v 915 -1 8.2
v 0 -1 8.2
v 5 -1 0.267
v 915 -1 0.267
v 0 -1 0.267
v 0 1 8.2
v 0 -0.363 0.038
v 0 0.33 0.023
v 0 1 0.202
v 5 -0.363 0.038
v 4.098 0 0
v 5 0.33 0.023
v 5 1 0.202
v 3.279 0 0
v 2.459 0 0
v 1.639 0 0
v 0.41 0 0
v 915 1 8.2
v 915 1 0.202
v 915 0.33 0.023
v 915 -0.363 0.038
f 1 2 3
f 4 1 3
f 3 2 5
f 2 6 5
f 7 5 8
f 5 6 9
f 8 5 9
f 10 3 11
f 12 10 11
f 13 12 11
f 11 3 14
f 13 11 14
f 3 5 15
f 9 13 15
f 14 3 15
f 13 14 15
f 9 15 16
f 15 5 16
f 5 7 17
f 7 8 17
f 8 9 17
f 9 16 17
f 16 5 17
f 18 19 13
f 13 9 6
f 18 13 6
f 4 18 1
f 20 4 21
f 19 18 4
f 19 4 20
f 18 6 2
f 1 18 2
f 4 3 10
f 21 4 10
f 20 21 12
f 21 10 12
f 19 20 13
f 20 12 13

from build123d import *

# Parameters (mm, degrees)
SCHIZZO1_R                  = 8
SCHIZZO1_W                  = 15
SCHIZZO1_H                  = 10
CORPOCENTINA_DEPTH          = 5
RIMOZIONERETROCENTINA_DEPTH = 251.615874848
SCHIZZO3_W                  = 28.2
SCHIZZO3_H                  = 22
TAGLIOLISTELLO_DEPTH        = 14.677233346
ESTRUSIONELISTELLO_DEPTH    = 910


with BuildPart() as part:
    # Schizzo1 → CorpoCentina (new body)
    with BuildSketch(Plane(origin=(0, 0, 0), x_dir=(0, 0, -1), z_dir=(1, 0, 0))):
        with BuildLine():
            add(Edge.make_bspline(
                [(-250, 0), (-250.000228294, -0.008042796), (-248.284955516, 0.172375658), (-246.518112419, 0.308690015), (-242.189387343, 0.685693594), (-236.806461263, 1.074101529), (-229.680385952, 1.49731724), (-221.184158698, 1.823218603), (-211.337618208, 1.967626101), (-200.371188527, 1.833221056), (-188.499913622, 1.38960529), (-175.953687417, 0.706014078), (-162.931424918, -0.160208642), (-149.615771744, -1.148016327), (-136.176354995, -2.19092491), (-122.767140548, -3.219583979), (-109.520053587, -4.152743127), (-96.546095975, -4.938564365), (-83.940819302, -5.536830703), (-71.801839291, -5.947648205), (-60.245256003, -6.218450939), (-49.398732891, -6.355369756), (-39.397226194, -6.381387963), (-30.361934842, -6.26504923), (-22.412181103, -6.012164917), (-15.626227231, -5.597433901), (-10.071907511, -4.928706579), (-5.697692612, -4.040446981), (-2.625320639, -2.865752984), (-0.494884225, -1.71152847), (0.021312549, -0.410454231), (-0.0311692, 0.792659827), (-0.812599242, 2.305684337), (-2.728863517, 4.238352424), (-5.769907241, 6.118172121), (-9.880942804, 7.913594202), (-15.074930468, 9.641318178), (-21.298752222, 11.283896488), (-28.49717212, 12.788381759), (-36.607373406, 14.097834908), (-45.57302844, 15.159429017), (-55.332910074, 15.960903998), (-65.816536498, 16.494069738), (-76.93137626, 16.791989705), (-88.566949028, 16.864754131), (-100.596999886, 16.726715291), (-112.888825982, 16.383385064), (-125.311615819, 15.825573667), (-137.743791097, 15.05233187), (-150.072384382, 14.059339074), (-162.191375056, 12.881586986), (-173.989074322, 11.549280346), (-185.352364446, 10.116249729), (-196.163081698, 8.632379125), (-206.300441402, 7.131513884), (-215.560350587, 5.731221768), (-223.977157043, 4.293295127), (-231.363413336, 3.181808874), (-237.746440904, 2.098942417), (-242.622069366, 1.245861917), (-246.644529332, 0.552864946), (-248.32839844, 0.246216765), (-249.999773563, 0.007977377), (-250, 0)],
                knots=[0, 0, 0, 0, 0.001588889, 0.006329218, 0.014202456, 0.025172808, 0.039173483, 0.056060631, 0.075578924, 0.097363607, 0.120926258, 0.145825281, 0.171670912, 0.198108537, 0.224790184, 0.25139058, 0.277643491, 0.30332675, 0.328257458, 0.352272548, 0.375156062, 0.396620664, 0.416422729, 0.43430442, 0.45005468, 0.463465465, 0.474478994, 0.483169222, 0.489678354, 0.494104066, 0.496910015, 0.497289785, 0.501214273, 0.50645795, 0.513356957, 0.522168632, 0.53296597, 0.545689209, 0.560220779, 0.576438923, 0.594258689, 0.613600245, 0.634342386, 0.656331109, 0.679351894, 0.703152303, 0.727478208, 0.752070739, 0.776691164, 0.801140184, 0.825214387, 0.848697424, 0.871352858, 0.892947449, 0.913230871, 0.931955467, 0.948342069, 0.963693004, 0.976235918, 0.986320059, 0.993788799, 0.998424035, 1, 1, 1, 1], degree=3))
        make_face()
        with Locations((-62.499919709, 5.077322704)):
            Circle(SCHIZZO1_R, mode=Mode.SUBTRACT)
        with Locations((-85.999919709, 5.077322704)):
            Rectangle(SCHIZZO1_W, SCHIZZO1_H, mode=Mode.SUBTRACT)
    extrude(amount=CORPOCENTINA_DEPTH)

    # Schizzo2 → RimozioneRetroCentina (cut, through all)
    with BuildSketch(Plane.ZY):
        with BuildLine():
            Line((10, 7.878242661), (10, -4.848721342))
            add(Edge.make_bspline(
                [(10, -4.848721342), (11.738439481, -5.129194219), (15.73141108, -5.603862327), (22.412181103, -6.012164917), (30.361934842, -6.26504923), (39.397226194, -6.381387963), (49.398732891, -6.355369756), (60.245256003, -6.218450939), (71.801839291, -5.947648205), (83.940819302, -5.536830703), (96.546095975, -4.938564365), (109.520053587, -4.152743127), (122.767140548, -3.219583979), (136.176354995, -2.19092491), (149.615771744, -1.148016327), (162.931424918, -0.160208642), (175.953687417, 0.706014078), (188.499913622, 1.38960529), (200.371188527, 1.833221056), (211.337618208, 1.967626101), (221.184158698, 1.823218603), (229.680385952, 1.49731724), (236.806461263, 1.074101529), (242.189387343, 0.685693594), (246.518112419, 0.308690015), (248.284955516, 0.172375658), (250.427328458, -0.052966701), (248.32839844, 0.246216765), (246.644529332, 0.552864946), (242.622069366, 1.245861917), (237.746440904, 2.098942417), (231.363413336, 3.181808874), (223.977157043, 4.293295127), (215.560350587, 5.731221768), (206.300441402, 7.131513884), (196.163081698, 8.632379125), (185.352364446, 10.116249729), (173.989074322, 11.549280346), (162.191375056, 12.881586986), (150.072384382, 14.059339074), (137.743791097, 15.05233187), (125.311615819, 15.825573667), (112.888825982, 16.383385064), (100.596999886, 16.726715291), (88.566949028, 16.864754131), (76.93137626, 16.791989705), (65.816536498, 16.494069738), (55.332910074, 15.960903998), (45.57302844, 15.159429017), (36.607373406, 14.097834908), (28.49717212, 12.788381759), (21.298752222, 11.283896488), (15.214838321, 9.678242373), (11.571404485, 8.475558385), (10, 7.878242661)],
                knots=[0.526143721, 0.526143721, 0.526143721, 0.526143721, 0.536534535, 0.54994532, 0.56569558, 0.583577271, 0.603379336, 0.624843938, 0.647727452, 0.671742542, 0.69667325, 0.722356509, 0.74860942, 0.775209816, 0.801891463, 0.828329088, 0.854174719, 0.879073742, 0.902636393, 0.924421076, 0.943939369, 0.960826517, 0.974827192, 0.985797544, 0.993670782, 0.998411111, 1, 1.001575965, 1.006211201, 1.013679941, 1.023764082, 1.036306996, 1.051657931, 1.068044533, 1.086769129, 1.107052551, 1.128647142, 1.151302576, 1.174785613, 1.198859816, 1.223308836, 1.247929261, 1.272521792, 1.296847697, 1.320648106, 1.343668891, 1.365657614, 1.386399755, 1.405741311, 1.423561077, 1.439779221, 1.454310791, 1.46703403, 1.476975978, 1.476975978, 1.476975978, 1.476975978], degree=3))
        make_face()
    extrude(amount=-RIMOZIONERETROCENTINA_DEPTH, mode=Mode.SUBTRACT)

    # Schizzo3 → TaglioListello (cut, through all)
    with BuildSketch(Plane(origin=(5, 0, 0), x_dir=(0, 0, -1), z_dir=(1, 0, 0))):
        with Locations((-4.099919705, -1.2163e-05)):
            Rectangle(SCHIZZO3_W, SCHIZZO3_H)
        with BuildLine():
            Line((-8.199919705, 0.999987837), (-8.199919705, -1.000012163))
            Line((-8.199919705, -1.000012163), (-0.266541428, -1.000012163))
            add(Edge.make_bspline(
                [(-0.266541428, -1.000012163), (-0.103493894, -0.689338227), (0.015569485, -0.278797762), (-0.014332603, 0.406690484), (-0.10008233, 0.738824912), (-0.201511969, 0.999987837)],
                knots=[0.494882134, 0.494882134, 0.494882134, 0.494882134, 0.496910015, 0.497289785, 0.498933258, 0.498933258, 0.498933258, 0.498933258], degree=3))
            Line((-0.201511969, 0.999987837), (-8.199919705, 0.999987837))
        make_face(mode=Mode.SUBTRACT)
    extrude(amount=-TAGLIOLISTELLO_DEPTH, mode=Mode.SUBTRACT)

    # Schizzo4 → EstrusioneListello (add)
    with BuildSketch(Plane(origin=(5, 0, 0), x_dir=(0, 0, -1), z_dir=(1, 0, 0))):
        with BuildLine():
            Line((-8.199919705, -1.000012163), (-0.266541428, -1.000012163))
            add(Edge.make_bspline(
                [(-0.266541428, -1.000012163), (-0.103493894, -0.689338227), (0.015569485, -0.278797762), (-0.014332603, 0.406690484), (-0.10008233, 0.738824912), (-0.201511969, 0.999987837)],
                knots=[0.494882134, 0.494882134, 0.494882134, 0.494882134, 0.496910015, 0.497289785, 0.498933258, 0.498933258, 0.498933258, 0.498933258], degree=3))
            Line((-0.201511969, 0.999987837), (-8.199919705, 0.999987837))
            Line((-8.199919705, 0.999987837), (-8.199919705, -1.000012163))
        make_face()
    extrude(amount=ESTRUSIONELISTELLO_DEPTH)


solid = part.part
